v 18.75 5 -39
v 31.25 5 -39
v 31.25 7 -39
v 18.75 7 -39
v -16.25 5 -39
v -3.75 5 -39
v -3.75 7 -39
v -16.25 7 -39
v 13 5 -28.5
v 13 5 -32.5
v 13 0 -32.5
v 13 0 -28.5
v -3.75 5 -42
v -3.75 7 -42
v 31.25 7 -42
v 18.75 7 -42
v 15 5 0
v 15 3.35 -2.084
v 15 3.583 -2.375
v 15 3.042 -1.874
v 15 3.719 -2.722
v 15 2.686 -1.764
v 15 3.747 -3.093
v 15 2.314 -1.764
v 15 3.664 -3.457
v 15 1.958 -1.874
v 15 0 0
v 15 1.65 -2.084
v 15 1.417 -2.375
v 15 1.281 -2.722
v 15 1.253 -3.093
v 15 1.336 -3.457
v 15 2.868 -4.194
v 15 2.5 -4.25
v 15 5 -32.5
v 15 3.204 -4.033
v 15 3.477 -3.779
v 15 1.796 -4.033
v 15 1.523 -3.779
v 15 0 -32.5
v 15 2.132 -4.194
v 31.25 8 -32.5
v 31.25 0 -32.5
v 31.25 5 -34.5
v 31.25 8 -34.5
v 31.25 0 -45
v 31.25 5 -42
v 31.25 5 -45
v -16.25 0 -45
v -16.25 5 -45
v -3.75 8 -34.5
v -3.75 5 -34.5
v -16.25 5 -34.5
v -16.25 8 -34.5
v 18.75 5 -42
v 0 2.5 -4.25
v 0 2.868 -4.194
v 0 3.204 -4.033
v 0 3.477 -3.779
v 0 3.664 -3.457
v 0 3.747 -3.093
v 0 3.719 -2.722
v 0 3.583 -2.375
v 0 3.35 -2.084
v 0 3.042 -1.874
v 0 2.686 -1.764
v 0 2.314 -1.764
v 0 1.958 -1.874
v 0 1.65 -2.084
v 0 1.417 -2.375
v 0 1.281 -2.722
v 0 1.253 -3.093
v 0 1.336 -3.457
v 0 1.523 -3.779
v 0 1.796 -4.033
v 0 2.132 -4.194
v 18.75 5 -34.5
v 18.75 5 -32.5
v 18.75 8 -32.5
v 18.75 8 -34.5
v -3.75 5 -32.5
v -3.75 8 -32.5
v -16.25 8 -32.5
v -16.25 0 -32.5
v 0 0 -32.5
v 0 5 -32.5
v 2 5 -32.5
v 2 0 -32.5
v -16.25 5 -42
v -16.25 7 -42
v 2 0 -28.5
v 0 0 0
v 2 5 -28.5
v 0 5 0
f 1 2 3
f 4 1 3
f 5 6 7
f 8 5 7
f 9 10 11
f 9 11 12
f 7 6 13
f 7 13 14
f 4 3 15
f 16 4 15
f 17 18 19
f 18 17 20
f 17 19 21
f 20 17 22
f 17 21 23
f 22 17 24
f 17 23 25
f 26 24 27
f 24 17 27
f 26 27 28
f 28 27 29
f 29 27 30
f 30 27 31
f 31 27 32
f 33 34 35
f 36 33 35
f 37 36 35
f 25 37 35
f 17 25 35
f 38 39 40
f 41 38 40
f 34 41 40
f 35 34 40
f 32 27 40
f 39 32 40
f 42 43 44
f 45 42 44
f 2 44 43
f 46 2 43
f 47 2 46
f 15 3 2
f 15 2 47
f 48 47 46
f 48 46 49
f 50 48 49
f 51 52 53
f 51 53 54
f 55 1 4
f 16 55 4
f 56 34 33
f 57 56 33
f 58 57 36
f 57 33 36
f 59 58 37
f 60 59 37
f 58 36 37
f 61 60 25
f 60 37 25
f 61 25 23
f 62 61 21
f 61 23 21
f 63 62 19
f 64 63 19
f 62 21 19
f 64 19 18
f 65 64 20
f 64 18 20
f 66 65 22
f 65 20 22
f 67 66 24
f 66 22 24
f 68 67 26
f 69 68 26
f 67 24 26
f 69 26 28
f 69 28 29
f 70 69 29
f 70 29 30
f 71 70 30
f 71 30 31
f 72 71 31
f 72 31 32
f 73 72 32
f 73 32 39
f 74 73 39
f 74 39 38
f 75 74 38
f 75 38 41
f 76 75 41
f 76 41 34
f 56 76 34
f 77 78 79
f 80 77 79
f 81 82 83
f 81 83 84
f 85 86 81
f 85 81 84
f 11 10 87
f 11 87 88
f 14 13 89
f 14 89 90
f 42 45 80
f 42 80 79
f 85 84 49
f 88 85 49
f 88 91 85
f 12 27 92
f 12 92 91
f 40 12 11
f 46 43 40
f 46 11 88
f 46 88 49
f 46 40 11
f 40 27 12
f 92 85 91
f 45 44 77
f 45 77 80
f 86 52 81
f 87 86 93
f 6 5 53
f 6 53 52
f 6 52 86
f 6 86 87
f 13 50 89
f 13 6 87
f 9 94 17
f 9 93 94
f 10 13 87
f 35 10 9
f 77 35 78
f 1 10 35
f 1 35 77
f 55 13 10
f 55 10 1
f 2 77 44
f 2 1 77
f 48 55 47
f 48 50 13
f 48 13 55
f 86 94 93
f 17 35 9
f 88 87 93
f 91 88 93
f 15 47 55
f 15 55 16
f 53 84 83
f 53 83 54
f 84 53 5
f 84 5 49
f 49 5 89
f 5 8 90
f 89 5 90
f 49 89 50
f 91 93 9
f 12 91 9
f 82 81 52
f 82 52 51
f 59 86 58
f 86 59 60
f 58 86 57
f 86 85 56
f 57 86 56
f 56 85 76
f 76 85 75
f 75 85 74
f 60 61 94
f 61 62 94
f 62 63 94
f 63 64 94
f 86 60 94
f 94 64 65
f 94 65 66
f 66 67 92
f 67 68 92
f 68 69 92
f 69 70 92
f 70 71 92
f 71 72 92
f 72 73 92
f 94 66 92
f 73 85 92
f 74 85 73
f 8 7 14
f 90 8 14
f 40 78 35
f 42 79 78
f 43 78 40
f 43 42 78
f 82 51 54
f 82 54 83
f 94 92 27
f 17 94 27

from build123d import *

# Parameters (mm, degrees)
BOSS_EXTRUDE1_DEPTH     = 5
SKETCH2_R               = 1.25
CUT_EXTRUDE2_DEPTH      = 56.014202712
CUT_EXTRUDE3_DEPTH      = 56.014202712
CUT_EXTRUDE3_DEPTH_BACK = 56.014202712
SKETCH6_W               = 11
SKETCH6_H               = 4
SKETCH8_W               = 3
SKETCH8_H               = 2
BOSS_EXTRUDE4_DEPTH     = 47.5
SKETCH9_W               = 22.5
SKETCH9_H               = 3
CUT_EXTRUDE5_DEPTH      = 48.5


with BuildPart() as part:
    # Sketch1 → Boss-Extrude1 (new body)
    with BuildSketch(Plane(origin=(0, 0, 0), x_dir=(1, 0, 0), z_dir=(0, 1, 0))):
        Polygon((0, 0), (15, 0), (15, 35), (31.25, 35), (31.25, 45), (-16.25, 45), (-16.25, 35), (0, 35), align=None)
    extrude(amount=BOSS_EXTRUDE1_DEPTH)

    # Sketch2 → Cut-Extrude2 (cut, through all)
    with BuildSketch(Plane(origin=(15, 0, 0), x_dir=(0, 0, -1), z_dir=(1, 0, 0))):
        with Locations((3, 2.5)):
            Circle(SKETCH2_R)
    extrude(amount=-CUT_EXTRUDE2_DEPTH, mode=Mode.SUBTRACT)

    # Sketch6 → Cut-Extrude3 (cut, two sides: drawn at the far end of the back side and taken through both)
    with BuildSketch(Plane.XZ.offset(-CUT_EXTRUDE3_DEPTH_BACK)):
        with Locations((7.5, -30.5)):
            Rectangle(SKETCH6_W, SKETCH6_H)
    extrude(amount=CUT_EXTRUDE3_DEPTH + CUT_EXTRUDE3_DEPTH_BACK, mode=Mode.SUBTRACT)

    # Sketch8 → Boss-Extrude4 (add)
    with BuildSketch(Plane(origin=(31.25, 0, 0), x_dir=(0, 0, -1), z_dir=(1, 0, 0))):
        with Locations((40.5, 6)):
            Rectangle(SKETCH8_W, SKETCH8_H)
        Polygon((34.5, 8), (32.5, 8), (32.5, 0), (35, 0), (35, 5), (34.5, 5), align=None)
    extrude(amount=-BOSS_EXTRUDE4_DEPTH)

    # Sketch9 → Cut-Extrude5 (cut)
    with BuildSketch(Plane.XY.offset(-32.5)):
        with Locations((7.5, 6.5)):
            Rectangle(SKETCH9_W, SKETCH9_H)
    extrude(amount=-CUT_EXTRUDE5_DEPTH, mode=Mode.SUBTRACT)


solid = part.part
